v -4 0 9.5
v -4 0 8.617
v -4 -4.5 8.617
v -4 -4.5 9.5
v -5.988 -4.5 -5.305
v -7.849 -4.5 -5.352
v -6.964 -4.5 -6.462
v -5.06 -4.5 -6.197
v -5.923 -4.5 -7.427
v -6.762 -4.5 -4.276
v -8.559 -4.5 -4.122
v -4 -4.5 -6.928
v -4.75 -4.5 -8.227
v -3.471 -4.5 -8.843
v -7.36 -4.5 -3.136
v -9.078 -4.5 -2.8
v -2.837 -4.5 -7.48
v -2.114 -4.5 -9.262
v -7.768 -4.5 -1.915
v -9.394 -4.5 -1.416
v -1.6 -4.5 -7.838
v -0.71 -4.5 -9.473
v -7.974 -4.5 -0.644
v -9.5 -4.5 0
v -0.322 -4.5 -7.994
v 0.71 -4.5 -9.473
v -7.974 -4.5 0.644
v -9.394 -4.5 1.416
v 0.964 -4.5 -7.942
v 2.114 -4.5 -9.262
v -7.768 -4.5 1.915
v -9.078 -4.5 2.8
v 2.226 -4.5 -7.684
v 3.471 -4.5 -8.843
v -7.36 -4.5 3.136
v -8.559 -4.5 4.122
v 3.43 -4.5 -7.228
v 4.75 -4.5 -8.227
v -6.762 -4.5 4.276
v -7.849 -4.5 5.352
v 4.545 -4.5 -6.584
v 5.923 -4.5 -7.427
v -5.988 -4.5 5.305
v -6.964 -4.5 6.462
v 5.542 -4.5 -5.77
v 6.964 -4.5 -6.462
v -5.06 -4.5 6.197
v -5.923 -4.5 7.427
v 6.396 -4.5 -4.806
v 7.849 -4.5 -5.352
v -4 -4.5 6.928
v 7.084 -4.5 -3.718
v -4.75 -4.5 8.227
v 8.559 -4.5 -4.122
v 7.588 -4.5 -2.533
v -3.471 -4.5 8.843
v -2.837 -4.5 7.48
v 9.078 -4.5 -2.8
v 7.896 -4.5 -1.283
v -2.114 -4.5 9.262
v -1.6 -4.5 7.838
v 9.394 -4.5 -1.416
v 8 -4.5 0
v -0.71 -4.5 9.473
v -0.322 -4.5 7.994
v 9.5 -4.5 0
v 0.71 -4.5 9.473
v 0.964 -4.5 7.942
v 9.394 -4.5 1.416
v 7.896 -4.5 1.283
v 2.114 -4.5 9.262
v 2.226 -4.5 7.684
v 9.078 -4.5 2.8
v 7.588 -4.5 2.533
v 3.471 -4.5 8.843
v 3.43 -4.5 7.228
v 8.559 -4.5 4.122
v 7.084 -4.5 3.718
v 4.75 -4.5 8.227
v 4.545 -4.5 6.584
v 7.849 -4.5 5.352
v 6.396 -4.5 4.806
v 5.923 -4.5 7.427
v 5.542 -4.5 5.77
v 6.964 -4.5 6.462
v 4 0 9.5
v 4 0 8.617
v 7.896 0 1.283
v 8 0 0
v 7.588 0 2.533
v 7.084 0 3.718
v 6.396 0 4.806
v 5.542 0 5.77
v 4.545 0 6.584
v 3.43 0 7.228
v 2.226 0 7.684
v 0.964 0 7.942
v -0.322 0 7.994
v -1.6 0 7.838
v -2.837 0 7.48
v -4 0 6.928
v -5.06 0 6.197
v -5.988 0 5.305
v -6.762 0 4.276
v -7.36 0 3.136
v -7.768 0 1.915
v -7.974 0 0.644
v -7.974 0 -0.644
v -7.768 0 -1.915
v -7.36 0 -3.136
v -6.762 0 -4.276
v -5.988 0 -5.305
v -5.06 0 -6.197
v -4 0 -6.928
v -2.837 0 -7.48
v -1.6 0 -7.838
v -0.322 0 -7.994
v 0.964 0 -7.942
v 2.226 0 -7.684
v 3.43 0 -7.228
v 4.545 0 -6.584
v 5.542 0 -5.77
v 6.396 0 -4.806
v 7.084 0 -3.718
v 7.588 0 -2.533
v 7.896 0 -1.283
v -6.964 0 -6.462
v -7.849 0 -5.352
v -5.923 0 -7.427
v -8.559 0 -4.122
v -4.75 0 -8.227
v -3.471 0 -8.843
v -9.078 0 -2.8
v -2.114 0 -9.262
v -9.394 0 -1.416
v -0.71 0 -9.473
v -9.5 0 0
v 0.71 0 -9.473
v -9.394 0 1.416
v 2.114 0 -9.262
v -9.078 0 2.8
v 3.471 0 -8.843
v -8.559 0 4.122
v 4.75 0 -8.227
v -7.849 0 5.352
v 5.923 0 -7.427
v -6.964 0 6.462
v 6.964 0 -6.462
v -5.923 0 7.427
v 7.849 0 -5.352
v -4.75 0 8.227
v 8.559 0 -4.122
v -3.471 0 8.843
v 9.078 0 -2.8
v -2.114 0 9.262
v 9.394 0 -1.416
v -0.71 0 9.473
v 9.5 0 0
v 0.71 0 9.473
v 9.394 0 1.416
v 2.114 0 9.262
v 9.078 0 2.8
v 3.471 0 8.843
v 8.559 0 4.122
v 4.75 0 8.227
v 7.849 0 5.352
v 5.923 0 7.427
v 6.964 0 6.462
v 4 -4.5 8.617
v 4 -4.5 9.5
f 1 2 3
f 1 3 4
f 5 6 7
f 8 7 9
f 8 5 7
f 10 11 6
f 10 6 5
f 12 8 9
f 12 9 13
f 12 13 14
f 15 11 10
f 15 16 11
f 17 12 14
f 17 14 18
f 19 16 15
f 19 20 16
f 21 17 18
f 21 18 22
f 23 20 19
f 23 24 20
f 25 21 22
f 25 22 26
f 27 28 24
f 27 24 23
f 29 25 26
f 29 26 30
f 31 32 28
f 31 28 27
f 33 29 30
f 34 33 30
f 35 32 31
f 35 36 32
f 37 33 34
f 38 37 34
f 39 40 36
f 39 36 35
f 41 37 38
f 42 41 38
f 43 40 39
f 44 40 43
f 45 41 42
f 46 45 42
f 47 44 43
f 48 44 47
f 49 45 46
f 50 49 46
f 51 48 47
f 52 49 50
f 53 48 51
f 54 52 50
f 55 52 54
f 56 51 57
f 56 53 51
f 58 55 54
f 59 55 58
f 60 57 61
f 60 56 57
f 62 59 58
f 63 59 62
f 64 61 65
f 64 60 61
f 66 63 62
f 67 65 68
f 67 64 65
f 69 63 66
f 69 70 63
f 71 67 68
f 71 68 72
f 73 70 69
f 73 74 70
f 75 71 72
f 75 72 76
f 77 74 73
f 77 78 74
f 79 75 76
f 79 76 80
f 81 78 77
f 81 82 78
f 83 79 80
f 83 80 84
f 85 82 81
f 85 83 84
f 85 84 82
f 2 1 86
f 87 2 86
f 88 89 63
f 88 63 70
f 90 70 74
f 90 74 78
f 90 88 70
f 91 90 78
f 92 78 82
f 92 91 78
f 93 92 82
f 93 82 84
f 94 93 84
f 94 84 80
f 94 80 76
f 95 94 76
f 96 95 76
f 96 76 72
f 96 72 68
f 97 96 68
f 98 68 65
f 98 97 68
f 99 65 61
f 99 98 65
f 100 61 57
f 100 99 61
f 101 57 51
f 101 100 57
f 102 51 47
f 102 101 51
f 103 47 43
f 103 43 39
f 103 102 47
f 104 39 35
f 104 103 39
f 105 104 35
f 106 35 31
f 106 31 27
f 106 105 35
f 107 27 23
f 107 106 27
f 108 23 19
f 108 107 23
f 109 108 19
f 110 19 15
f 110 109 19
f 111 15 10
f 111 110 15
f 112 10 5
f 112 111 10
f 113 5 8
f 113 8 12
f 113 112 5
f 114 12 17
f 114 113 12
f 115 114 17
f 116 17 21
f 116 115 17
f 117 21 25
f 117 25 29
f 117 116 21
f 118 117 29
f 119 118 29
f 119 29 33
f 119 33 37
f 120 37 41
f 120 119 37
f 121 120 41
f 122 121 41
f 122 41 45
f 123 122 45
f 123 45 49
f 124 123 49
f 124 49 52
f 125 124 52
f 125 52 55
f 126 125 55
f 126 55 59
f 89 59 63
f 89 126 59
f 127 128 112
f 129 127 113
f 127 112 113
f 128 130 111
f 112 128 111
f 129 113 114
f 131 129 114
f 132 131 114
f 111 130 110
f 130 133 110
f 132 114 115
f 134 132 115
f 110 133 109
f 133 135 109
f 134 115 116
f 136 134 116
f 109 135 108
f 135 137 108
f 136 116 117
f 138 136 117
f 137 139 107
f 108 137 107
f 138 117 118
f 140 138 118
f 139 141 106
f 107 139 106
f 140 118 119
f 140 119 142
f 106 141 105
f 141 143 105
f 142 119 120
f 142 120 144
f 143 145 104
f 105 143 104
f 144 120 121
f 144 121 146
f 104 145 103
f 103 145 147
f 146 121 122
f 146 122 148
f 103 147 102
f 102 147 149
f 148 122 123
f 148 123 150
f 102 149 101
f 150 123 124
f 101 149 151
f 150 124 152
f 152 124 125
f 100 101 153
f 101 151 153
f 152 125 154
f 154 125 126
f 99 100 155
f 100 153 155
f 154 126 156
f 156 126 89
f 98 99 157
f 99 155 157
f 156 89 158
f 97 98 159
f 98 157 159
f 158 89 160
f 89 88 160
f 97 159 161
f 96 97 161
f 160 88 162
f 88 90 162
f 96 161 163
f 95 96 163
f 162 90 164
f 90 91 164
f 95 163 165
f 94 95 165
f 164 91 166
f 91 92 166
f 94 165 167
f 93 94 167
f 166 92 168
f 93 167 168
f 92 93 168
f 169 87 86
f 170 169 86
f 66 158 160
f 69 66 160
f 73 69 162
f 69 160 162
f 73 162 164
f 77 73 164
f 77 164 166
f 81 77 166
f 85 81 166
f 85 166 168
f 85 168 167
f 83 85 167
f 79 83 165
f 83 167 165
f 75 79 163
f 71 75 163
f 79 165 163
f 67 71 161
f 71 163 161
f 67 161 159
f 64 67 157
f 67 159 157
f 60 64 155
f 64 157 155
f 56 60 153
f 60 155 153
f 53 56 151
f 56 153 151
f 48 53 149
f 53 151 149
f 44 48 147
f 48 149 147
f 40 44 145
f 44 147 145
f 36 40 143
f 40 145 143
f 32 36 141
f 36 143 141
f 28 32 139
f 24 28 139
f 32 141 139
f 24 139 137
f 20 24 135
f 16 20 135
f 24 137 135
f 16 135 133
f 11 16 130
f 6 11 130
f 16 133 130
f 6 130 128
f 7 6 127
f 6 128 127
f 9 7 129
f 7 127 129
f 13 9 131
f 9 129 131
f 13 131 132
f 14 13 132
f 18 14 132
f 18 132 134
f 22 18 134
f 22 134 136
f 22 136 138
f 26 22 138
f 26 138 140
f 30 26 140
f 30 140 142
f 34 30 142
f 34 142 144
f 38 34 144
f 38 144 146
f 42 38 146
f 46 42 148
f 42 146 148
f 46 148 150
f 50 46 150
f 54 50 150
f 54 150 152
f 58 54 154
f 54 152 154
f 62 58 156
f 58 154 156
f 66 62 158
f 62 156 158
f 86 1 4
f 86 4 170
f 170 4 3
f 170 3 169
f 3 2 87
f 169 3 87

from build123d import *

# Parameters (mm, degrees)
F0_R     = 9.5
F0_R_2   = 8
F1_DEPTH = 4.5
F2_W     = 8
F2_H     = 0.883156
F3_DEPTH = 4.5


with BuildPart() as f1:
    # F0 (on Front) → F1 (new body)
    with BuildSketch(Plane.XZ):
        Circle(F0_R)
        Circle(F0_R_2, mode=Mode.SUBTRACT)
    extrude(amount=F1_DEPTH)


with BuildPart() as f3:
    # F2 (on Front) → F3 (new body)
    with BuildSketch(Plane.XZ):
        with Locations((0, 9.058422)):
            Rectangle(F2_W, F2_H)
    extrude(amount=F3_DEPTH)


solid = Compound([f1.part, f3.part])
